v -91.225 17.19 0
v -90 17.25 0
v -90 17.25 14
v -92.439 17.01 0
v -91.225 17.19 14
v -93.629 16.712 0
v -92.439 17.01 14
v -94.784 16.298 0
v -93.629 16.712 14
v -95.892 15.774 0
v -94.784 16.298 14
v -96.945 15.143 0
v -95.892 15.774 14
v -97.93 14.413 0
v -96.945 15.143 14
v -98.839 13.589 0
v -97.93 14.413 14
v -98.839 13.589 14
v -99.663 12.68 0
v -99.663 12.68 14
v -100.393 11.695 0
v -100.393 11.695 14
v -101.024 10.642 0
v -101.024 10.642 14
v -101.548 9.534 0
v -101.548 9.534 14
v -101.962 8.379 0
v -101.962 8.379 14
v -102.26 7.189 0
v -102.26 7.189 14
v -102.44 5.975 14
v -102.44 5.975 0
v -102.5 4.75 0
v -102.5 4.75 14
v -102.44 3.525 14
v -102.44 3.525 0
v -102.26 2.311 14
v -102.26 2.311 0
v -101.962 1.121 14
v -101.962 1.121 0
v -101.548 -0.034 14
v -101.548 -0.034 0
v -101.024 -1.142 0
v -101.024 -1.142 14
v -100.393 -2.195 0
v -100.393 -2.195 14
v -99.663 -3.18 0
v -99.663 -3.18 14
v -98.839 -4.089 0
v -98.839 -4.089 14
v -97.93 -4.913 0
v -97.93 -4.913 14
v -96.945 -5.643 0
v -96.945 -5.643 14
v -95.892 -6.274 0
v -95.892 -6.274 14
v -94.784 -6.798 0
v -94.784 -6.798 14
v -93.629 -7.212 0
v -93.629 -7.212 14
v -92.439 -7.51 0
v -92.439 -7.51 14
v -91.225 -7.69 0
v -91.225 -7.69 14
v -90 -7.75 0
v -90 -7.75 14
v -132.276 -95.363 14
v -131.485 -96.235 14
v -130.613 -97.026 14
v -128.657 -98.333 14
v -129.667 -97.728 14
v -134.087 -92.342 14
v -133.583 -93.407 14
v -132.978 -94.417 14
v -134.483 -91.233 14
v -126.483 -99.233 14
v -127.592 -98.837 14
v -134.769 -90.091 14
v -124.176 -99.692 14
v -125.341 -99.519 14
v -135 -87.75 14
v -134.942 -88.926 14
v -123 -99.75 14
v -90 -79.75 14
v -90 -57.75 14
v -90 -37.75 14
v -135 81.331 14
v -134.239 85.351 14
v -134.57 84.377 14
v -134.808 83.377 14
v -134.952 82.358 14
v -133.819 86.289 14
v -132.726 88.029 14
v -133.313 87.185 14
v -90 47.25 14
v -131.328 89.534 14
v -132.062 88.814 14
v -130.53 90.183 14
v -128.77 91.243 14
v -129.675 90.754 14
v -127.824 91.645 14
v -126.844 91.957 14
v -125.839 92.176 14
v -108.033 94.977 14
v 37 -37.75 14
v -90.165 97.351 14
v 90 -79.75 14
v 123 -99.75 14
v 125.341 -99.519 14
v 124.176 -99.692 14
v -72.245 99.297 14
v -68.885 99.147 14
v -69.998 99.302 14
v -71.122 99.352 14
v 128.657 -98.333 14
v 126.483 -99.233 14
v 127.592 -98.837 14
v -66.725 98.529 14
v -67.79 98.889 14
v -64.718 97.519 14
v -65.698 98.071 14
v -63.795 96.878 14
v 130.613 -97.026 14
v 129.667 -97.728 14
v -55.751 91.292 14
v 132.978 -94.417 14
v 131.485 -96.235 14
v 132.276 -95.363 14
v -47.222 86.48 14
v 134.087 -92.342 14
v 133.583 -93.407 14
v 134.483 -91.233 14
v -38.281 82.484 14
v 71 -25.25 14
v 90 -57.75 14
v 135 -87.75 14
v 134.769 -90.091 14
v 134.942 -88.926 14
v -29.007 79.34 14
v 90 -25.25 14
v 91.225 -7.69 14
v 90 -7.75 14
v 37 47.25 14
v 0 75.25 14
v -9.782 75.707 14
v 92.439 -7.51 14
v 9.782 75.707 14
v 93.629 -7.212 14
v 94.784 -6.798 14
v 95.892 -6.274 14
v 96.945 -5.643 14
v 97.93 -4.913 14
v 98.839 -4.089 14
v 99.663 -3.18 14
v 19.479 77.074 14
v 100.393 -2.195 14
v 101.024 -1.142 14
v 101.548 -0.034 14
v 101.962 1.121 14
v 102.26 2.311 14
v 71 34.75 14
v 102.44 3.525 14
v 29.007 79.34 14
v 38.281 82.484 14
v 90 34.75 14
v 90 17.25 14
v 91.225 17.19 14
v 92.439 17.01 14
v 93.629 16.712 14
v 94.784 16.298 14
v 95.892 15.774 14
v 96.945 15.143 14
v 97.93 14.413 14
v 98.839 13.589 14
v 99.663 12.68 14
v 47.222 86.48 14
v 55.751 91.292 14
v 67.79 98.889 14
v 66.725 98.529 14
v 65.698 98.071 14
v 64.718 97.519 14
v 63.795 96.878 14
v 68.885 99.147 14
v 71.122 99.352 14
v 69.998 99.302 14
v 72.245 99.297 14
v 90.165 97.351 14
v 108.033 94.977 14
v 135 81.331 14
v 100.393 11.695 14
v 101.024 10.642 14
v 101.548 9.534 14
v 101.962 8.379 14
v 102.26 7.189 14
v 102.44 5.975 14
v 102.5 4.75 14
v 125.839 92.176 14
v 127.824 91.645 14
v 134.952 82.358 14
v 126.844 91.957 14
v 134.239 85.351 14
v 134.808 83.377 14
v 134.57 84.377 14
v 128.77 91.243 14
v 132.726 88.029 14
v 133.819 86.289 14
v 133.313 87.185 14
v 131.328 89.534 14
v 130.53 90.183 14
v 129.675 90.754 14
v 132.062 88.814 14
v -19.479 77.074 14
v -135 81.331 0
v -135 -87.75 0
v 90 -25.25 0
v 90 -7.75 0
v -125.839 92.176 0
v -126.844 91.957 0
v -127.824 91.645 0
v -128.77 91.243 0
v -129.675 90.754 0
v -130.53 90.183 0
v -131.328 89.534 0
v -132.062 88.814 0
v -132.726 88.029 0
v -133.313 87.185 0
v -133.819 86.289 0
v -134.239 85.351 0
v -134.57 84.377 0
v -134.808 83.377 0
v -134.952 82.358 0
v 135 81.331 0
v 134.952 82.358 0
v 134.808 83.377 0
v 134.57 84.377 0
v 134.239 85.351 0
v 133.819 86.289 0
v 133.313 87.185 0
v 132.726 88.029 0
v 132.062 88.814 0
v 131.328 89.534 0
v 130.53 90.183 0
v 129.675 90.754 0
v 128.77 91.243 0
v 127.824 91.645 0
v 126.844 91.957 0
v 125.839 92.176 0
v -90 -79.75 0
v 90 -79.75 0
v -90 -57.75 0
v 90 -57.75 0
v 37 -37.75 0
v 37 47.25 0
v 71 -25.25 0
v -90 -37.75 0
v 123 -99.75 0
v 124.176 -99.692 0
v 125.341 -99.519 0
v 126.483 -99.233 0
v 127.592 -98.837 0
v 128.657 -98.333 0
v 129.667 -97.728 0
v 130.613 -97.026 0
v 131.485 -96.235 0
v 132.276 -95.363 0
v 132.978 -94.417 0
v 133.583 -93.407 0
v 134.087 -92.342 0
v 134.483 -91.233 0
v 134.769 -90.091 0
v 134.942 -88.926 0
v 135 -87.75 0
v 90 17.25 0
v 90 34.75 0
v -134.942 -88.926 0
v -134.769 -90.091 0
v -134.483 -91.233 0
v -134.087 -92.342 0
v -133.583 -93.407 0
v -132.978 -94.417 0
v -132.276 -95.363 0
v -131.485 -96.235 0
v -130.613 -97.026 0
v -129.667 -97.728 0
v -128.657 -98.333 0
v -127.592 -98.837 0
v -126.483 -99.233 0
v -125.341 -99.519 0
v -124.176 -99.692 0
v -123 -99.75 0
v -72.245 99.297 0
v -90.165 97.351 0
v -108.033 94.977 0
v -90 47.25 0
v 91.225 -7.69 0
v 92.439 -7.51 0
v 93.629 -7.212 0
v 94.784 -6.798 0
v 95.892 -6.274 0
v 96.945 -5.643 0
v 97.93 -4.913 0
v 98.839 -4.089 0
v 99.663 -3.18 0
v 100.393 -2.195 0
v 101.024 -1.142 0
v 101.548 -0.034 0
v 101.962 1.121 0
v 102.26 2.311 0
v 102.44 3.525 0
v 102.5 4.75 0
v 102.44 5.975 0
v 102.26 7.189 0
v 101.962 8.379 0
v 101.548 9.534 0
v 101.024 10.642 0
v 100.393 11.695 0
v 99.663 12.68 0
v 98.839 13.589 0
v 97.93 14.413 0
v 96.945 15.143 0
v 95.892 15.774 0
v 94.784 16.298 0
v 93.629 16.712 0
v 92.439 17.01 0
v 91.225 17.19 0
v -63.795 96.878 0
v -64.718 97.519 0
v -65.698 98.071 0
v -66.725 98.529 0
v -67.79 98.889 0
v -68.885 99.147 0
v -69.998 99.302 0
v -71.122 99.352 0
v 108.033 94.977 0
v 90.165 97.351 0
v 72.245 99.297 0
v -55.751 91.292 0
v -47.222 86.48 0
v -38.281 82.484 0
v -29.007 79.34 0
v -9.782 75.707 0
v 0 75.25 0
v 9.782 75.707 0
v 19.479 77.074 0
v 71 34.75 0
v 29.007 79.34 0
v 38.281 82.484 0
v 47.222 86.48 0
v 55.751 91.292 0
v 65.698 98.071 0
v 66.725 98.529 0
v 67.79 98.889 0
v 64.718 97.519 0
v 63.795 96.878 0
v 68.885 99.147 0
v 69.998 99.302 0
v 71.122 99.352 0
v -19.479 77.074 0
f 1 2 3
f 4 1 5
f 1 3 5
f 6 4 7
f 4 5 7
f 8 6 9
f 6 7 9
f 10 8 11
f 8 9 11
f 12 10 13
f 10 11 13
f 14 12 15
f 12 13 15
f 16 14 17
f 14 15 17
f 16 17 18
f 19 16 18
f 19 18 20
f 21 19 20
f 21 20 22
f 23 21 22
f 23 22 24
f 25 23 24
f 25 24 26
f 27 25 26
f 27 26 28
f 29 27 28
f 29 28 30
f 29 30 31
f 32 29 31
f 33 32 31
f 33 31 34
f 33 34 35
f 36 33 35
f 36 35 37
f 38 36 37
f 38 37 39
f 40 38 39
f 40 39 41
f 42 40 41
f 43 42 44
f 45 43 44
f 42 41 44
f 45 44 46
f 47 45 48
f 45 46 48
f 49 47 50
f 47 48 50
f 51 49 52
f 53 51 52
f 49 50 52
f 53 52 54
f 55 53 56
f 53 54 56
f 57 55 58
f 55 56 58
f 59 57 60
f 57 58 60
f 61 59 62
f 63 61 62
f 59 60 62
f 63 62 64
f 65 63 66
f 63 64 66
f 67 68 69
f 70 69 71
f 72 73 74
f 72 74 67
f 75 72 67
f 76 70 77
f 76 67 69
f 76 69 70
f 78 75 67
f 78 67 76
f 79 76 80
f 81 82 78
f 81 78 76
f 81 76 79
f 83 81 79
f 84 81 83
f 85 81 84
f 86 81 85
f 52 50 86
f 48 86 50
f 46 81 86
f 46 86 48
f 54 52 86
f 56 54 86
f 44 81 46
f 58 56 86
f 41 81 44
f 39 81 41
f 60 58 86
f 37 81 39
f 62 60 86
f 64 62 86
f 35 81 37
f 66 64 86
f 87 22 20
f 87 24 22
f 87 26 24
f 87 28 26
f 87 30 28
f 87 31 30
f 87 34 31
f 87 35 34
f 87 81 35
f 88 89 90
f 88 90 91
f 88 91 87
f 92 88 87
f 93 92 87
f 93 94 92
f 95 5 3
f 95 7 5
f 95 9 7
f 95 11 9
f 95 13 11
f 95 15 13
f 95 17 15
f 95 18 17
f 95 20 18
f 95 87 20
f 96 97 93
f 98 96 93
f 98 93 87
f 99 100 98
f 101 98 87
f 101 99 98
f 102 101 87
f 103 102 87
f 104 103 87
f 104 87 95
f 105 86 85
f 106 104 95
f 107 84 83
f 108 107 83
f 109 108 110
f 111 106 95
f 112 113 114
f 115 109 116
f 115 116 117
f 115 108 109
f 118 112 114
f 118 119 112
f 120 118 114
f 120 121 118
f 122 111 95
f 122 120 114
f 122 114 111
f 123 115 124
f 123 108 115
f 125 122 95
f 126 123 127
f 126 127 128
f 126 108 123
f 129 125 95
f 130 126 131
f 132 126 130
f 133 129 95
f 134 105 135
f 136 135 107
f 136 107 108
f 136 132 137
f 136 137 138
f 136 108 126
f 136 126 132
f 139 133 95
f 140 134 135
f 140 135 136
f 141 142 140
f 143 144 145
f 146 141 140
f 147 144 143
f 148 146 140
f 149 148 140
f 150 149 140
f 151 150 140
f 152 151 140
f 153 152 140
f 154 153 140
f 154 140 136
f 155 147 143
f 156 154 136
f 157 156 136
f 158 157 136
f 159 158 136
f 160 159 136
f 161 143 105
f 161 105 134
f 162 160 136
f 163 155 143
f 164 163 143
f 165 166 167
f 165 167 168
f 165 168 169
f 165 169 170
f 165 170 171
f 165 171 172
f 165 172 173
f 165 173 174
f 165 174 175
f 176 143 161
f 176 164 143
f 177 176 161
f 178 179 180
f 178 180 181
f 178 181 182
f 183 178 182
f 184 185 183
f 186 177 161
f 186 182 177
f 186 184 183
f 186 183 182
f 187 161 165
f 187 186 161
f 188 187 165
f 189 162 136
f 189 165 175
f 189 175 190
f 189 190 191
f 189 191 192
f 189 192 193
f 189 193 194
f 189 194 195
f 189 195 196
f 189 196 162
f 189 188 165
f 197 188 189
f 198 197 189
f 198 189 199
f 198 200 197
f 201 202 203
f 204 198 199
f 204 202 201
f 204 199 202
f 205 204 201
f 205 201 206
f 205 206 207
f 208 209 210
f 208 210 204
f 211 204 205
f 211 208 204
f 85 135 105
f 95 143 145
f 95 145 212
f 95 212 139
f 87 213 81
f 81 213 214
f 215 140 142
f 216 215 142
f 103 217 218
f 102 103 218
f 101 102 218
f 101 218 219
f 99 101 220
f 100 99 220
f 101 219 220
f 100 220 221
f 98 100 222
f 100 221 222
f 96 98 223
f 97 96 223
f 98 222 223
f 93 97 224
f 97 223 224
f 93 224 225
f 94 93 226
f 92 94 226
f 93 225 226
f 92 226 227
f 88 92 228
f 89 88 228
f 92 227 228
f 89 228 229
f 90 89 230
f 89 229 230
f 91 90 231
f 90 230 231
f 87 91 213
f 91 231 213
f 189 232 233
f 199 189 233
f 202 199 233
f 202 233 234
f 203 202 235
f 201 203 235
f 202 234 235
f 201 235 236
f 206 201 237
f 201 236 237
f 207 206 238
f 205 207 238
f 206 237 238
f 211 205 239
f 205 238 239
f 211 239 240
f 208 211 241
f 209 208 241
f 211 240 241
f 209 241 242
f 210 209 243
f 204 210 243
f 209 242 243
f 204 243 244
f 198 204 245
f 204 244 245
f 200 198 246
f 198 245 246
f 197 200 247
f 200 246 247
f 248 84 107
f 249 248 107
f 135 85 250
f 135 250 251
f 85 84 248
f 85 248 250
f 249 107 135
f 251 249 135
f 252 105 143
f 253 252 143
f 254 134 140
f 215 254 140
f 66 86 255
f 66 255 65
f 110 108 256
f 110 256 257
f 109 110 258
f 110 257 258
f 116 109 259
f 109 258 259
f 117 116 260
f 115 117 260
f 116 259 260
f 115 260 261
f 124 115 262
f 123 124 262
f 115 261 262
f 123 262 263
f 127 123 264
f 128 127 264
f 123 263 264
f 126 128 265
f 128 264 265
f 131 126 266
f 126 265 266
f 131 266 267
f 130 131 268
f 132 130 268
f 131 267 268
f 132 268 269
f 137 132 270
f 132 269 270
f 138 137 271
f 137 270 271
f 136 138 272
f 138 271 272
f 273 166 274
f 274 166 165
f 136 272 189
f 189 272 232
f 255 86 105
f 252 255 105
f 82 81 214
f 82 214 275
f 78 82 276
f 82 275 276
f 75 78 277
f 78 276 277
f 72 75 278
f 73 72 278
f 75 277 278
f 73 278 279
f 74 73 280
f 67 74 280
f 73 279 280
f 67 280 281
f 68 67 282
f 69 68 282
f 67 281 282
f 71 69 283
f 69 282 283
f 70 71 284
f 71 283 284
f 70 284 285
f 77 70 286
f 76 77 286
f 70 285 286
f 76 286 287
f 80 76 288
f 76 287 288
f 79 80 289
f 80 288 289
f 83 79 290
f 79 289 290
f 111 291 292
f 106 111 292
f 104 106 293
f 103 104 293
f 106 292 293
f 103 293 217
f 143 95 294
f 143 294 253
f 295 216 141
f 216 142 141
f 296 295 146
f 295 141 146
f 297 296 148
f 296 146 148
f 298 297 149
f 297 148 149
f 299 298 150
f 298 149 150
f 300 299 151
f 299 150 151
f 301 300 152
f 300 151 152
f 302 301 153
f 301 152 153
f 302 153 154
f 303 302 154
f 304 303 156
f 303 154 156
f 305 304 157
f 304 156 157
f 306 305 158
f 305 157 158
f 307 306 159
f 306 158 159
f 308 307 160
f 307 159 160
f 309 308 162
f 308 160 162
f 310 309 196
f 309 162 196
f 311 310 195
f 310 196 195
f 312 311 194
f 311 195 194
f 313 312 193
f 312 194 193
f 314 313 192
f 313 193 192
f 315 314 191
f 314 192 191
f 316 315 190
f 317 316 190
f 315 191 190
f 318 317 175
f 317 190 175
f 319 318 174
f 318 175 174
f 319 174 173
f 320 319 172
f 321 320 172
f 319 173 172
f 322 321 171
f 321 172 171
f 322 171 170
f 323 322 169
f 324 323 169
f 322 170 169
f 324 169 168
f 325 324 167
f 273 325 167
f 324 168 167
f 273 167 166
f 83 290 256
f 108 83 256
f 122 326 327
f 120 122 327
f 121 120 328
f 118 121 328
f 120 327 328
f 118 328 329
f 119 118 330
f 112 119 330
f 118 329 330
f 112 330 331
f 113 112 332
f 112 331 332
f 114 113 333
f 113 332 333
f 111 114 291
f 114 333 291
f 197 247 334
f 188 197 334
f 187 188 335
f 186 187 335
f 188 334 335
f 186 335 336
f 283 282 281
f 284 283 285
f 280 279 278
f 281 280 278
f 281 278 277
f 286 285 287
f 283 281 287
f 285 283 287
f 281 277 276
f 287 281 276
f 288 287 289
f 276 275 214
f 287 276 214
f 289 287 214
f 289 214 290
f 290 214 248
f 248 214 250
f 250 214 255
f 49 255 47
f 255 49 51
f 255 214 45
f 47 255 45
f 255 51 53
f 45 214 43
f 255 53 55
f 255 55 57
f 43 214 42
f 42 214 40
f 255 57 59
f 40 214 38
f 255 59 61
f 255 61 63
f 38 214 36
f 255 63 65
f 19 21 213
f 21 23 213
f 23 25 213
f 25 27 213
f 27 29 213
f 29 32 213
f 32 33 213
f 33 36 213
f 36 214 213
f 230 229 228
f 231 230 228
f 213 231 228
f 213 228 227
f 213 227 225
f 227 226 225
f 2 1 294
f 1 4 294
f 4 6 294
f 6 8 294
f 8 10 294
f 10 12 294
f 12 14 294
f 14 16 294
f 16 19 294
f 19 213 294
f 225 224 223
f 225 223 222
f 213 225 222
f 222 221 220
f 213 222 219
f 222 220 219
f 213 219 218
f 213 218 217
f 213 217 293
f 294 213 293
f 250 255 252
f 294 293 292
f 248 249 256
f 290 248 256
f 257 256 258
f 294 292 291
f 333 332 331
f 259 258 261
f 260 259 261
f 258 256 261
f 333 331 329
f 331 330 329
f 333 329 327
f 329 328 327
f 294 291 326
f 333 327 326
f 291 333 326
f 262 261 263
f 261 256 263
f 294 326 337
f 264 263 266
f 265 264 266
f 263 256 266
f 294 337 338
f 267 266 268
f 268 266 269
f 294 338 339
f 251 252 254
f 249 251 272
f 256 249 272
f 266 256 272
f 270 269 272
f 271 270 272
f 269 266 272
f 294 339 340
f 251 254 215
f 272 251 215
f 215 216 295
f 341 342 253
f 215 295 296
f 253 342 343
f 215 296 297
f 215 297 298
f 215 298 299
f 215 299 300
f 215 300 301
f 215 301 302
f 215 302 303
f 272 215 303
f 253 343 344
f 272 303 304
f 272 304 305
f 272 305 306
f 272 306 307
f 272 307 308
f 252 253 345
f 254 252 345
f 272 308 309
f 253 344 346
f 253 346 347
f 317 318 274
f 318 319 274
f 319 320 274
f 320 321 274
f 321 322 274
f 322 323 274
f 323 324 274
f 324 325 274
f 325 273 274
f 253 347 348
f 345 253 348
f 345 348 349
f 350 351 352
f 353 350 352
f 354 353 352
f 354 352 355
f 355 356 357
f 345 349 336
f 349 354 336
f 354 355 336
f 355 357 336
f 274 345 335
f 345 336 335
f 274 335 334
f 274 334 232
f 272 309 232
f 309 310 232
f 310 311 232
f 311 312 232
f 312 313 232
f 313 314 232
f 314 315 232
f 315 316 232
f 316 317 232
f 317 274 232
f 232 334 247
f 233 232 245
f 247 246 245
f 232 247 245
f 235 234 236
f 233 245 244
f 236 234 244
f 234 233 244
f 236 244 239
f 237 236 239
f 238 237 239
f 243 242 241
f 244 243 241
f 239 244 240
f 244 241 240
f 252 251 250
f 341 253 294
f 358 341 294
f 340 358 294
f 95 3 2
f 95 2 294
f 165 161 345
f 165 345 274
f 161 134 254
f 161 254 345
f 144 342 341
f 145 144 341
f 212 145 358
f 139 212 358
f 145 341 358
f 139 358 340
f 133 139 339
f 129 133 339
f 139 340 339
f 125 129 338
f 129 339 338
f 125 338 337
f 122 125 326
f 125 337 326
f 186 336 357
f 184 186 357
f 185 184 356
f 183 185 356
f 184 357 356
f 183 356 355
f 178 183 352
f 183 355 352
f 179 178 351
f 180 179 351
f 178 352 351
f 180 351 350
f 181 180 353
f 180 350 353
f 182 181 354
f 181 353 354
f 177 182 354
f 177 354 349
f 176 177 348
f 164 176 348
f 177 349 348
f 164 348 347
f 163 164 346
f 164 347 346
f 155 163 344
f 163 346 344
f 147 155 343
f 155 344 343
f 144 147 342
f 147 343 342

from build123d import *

# Parameters (mm, degrees)
F1_DEPTH = 14
F2_W     = 127
F2_H     = 85
F2_W_2   = 180
F2_H_2   = 22
F2_W_3   = 19
F2_H_3   = 60
F3_DEPTH = 25
F4_R     = 12.5
F5_DEPTH = 25


with BuildPart() as f1:
    # F0 (on Top) → F1 (new body)
    with BuildSketch(Plane.XY):
        with BuildLine():
            ThreePointArc((-135, -87.75), (-131.485281, -96.235281), (-123, -99.75))
            Line((-123, -99.75), (123, -99.75))
            ThreePointArc((123, -99.75), (131.485281, -96.235281), (135, -87.75))
            Line((135, -87.75), (135, 81.331121))
            ThreePointArc((135, 81.331121), (132.403394, 88.429218), (125.839459, 92.17623))
            ThreePointArc((125.839459, 92.17623), (99.105981, 96.217898), (72.244569, 99.296609))
            ThreePointArc((72.244569, 99.296609), (67.790252, 98.888715), (63.794752, 96.877918))
            ThreePointArc((63.794752, 96.877918), (33.680622, 80.80401), (0, 75.25))
            ThreePointArc((0, 75.25), (-33.680622, 80.80401), (-63.794752, 96.877918))
            ThreePointArc((-63.794752, 96.877918), (-67.790252, 98.888715), (-72.244569, 99.296609))
            ThreePointArc((-72.244569, 99.296609), (-99.105981, 96.217898), (-125.839459, 92.17623))
            ThreePointArc((-125.839459, 92.17623), (-132.403394, 88.429218), (-135, 81.331121))
            Line((-135, 81.331121), (-135, -87.75))
        make_face()
    extrude(amount=F1_DEPTH)

    # F2 (on face) → F3 (cut)
    with BuildSketch(Plane.XY.offset(14)):
        with Locations((-26.5, 4.75)):
            Rectangle(F2_W, F2_H)
        with Locations((0, -68.75)):
            Rectangle(F2_W_2, F2_H_2)
        with Locations((80.5, 4.75)):
            Rectangle(F2_W_3, F2_H_3)
    extrude(amount=-F3_DEPTH, mode=Mode.SUBTRACT)

    # F4 (on face) → F5 (cut)
    with BuildSketch(Plane.XY.offset(14)):
        with Locations((-90, 4.75)):
            Circle(F4_R)
        with Locations((90, 4.75)):
            Circle(F4_R)
    extrude(amount=-F5_DEPTH, mode=Mode.SUBTRACT)


solid = f1.part
